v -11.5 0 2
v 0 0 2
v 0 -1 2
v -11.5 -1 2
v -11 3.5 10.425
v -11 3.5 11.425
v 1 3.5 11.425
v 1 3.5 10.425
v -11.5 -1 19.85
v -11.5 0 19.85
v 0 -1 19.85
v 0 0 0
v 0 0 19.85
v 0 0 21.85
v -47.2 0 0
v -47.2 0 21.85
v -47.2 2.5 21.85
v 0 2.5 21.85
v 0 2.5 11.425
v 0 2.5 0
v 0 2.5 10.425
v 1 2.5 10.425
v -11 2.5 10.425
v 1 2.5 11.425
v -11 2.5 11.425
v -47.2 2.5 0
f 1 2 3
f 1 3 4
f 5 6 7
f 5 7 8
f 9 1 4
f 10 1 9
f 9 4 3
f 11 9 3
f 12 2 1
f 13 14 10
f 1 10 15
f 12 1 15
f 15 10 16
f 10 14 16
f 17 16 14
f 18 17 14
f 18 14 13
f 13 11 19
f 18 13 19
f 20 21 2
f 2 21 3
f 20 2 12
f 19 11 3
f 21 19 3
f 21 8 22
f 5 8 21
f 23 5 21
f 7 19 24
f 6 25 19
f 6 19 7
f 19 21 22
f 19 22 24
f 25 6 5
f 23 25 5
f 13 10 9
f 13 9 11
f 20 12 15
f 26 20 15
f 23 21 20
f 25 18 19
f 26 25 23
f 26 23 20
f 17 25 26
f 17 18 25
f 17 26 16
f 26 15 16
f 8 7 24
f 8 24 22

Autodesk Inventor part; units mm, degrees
ref_plane "YZ Plane" through (0, 0, 0) normal (1, 0, 0) x (0, 1, 0)
ref_plane "XZ Plane" through (0, 0, 0) normal (0, 1, 0) x (-1, 0, 0)
ref_plane "XY Plane" through (0, 0, 0) normal (0, 0, 1) x (1, 0, 0)
sketch "Skizze2" plane through (0, 0, 0) normal (0, 1, 0) x (-1, 0, 0)
  line L0 (0, 0) -> (47.2, 0)
  line L1 (47.2, 0) -> (47.2, 21.85)
  line L2 (47.2, 21.85) -> (0, 21.85)
  line L3 (0, 21.85) -> (0, 0)
  dimension "d5" = 47.2
  dimension "d6" = 21.85
extrude "Extrusion2" add sketch "Skizze2" along normal blind 2.5
sketch "Skizze3" plane through (0, 0, 21.85) normal (1, 0, 0) x (0, 0, -1)
  line L0 (10.425, 3.5) -> (11.425, 3.5)
  line L1 (11.425, 3.5) -> (11.425, 2.5)
  line L2 (11.425, 2.5) -> (10.425, 2.5)
  line L3 (10.425, 2.5) -> (10.425, 3.5)
  line L4 (0, 2.5) -> (21.85, 2.5) projected
  point P0 (21.85, 0)
  point P1 (10.925, 2.5)
  point P2 (10.925, 2.5)
  point P3 (10.925, 2.5)
  dimension "d9" = 1
  dimension "d10" = 1
extrude "Extrusion3" add sketch "Skizze3" along normal blind 1 and the other way blind 11
sketch "Skizze4" plane through (-47.2, 0, 0) normal (-1, 0, 0) x (0, 0, 1)
  line L0 (4.925, 4.6) -> (16.925, 4.6)
  line L1 (16.925, 4.6) -> (16.925, 0)
  line L2 (16.925, 0) -> (4.925, 0)
  line L3 (4.925, 0) -> (4.925, 4.6)
  line L4 (0, 0) -> (21.85, 0) projected
  point P0 (10.925, 0)
  point P1 (10.925, 0)
  point P2 (10.925, 0)
  dimension "d15" = 12
  dimension "d16" = 4.6
extrude "Extrusion4" [suppressed]
sketch "Skizze5" plane through (0, 0, 0) normal (0, -1, 0) x (1, 0, 0)
  line L0 (-47.2, 17.425) -> (-41, 17.425)
  line L1 (-41, 17.425) -> (-41, 4.425)
  line L2 (-41, 4.425) -> (-47.2, 4.425)
  line L3 (-47.2, 4.425) -> (-47.2, 17.425)
  line L4 (-47.2, 16.925) -> (-61.7, 16.925) projected
  line L5 (-47.2, 4.925) -> (-61.7, 4.925) projected
  line L6 (0, 21.85) -> (0, 0) projected
  line L7 (-11.5, 19.85) -> (0, 19.85)
  line L8 (0, 19.85) -> (0, 2)
  line L9 (0, 2) -> (-11.5, 2)
  line L10 (-11.5, 2) -> (-11.5, 19.85)
  line L11 (-47.2, 21.85) -> (0, 21.85) projected
  line L12 (0, 0) -> (-47.2, 0) projected
  point P0 (0, 19.85)
  dimension "d21" = 6.2
  dimension "d22" = 13
  dimension "d23" = 0.5
  dimension "d24" = 0.5
  dimension "d25" = 11.5
  dimension "d26" = 2
  dimension "d27" = 2
extrude "Extrusion5" add sketch "Skizze5" along normal blind 1 contours L6 L9 L10 L7
ref_plane "Arbeitsebene1" through (-47.2, 0, 10.925) normal (0, 0, 1) x (1, 0, 0)
equation "\"d23\" = d24"
properties part number "hdmi grabber"
